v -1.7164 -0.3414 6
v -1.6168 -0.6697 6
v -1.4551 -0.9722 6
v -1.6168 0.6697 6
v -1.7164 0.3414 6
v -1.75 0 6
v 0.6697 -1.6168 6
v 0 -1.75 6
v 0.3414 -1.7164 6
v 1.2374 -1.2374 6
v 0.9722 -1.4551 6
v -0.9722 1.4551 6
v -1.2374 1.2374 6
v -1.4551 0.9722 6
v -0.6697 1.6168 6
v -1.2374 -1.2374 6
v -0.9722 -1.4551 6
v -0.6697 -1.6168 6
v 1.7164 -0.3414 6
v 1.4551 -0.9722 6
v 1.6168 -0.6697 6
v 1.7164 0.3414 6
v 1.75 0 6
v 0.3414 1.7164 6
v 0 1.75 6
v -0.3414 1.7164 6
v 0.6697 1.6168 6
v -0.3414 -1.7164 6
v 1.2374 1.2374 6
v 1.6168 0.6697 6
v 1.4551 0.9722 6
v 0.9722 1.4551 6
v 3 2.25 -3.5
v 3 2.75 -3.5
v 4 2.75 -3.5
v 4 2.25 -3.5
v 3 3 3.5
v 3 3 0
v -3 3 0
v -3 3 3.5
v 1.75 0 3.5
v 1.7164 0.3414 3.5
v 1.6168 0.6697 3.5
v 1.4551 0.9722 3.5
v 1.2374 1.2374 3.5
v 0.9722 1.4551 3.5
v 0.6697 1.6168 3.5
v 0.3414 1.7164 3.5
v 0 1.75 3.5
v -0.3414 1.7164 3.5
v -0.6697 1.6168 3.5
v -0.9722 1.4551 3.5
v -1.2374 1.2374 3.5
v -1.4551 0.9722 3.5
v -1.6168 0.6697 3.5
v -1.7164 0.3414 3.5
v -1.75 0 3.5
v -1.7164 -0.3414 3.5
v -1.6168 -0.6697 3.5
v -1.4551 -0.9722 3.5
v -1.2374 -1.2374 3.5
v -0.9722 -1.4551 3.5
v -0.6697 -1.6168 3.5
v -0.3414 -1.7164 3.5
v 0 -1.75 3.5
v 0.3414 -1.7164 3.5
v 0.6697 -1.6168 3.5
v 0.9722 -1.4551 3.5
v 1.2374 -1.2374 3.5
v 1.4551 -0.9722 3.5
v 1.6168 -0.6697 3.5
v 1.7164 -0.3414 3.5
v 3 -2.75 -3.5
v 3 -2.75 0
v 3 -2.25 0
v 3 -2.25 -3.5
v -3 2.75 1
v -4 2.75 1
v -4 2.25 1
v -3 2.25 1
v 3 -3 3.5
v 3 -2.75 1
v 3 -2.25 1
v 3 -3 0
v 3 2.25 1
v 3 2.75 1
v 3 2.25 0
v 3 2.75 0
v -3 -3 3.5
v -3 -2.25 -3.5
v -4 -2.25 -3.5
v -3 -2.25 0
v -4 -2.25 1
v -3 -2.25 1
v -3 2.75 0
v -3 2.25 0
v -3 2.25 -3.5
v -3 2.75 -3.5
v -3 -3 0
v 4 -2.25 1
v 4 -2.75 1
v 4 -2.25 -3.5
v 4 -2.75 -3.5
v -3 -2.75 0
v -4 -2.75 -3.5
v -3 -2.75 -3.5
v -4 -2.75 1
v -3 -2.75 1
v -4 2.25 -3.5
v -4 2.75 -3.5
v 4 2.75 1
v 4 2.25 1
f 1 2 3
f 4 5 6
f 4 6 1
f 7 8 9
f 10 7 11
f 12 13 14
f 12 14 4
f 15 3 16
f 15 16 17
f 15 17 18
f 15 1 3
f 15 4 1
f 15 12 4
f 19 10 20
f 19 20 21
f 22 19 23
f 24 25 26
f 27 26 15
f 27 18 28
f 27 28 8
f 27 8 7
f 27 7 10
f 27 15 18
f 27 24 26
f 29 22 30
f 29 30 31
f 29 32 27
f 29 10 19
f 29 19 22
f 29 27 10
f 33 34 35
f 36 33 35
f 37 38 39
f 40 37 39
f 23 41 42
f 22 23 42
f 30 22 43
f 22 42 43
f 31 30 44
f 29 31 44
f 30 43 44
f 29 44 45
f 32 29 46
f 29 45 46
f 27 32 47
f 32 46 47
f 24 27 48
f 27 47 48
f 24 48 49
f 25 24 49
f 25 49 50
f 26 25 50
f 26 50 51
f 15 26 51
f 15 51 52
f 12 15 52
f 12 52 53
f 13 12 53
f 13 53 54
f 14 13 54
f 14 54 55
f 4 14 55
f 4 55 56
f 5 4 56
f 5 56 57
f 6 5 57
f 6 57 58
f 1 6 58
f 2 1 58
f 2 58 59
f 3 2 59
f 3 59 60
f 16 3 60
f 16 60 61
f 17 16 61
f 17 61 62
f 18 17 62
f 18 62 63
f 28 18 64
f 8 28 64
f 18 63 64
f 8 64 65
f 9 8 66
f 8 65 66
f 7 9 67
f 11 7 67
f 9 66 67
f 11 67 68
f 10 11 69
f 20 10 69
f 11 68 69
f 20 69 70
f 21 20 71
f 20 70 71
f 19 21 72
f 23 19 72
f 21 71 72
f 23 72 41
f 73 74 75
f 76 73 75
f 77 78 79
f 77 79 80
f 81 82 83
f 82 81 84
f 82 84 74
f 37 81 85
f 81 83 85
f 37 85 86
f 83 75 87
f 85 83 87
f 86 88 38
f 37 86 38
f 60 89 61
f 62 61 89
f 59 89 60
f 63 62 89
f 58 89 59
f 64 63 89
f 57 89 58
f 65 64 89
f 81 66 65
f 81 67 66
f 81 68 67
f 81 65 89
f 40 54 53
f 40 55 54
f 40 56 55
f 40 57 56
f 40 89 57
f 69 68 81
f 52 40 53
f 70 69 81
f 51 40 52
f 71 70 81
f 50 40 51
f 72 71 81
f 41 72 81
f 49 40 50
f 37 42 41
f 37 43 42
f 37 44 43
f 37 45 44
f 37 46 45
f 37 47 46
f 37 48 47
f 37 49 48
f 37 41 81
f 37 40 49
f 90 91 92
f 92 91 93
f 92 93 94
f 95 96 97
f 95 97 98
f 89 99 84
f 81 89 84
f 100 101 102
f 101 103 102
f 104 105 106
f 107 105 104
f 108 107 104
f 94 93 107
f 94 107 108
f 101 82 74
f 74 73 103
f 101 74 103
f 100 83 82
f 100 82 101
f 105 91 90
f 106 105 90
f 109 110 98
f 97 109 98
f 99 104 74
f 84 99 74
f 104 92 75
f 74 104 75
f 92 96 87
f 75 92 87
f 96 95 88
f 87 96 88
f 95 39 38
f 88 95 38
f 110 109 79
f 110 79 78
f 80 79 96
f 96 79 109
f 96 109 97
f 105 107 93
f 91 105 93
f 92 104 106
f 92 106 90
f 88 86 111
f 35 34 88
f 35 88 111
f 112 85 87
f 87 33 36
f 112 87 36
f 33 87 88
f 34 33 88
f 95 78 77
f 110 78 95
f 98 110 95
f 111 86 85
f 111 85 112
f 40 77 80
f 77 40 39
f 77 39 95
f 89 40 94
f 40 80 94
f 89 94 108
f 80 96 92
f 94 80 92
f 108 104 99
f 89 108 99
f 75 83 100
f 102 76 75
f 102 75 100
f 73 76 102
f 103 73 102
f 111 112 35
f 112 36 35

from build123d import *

# Parameters (mm, degrees)
F0_R          = 1.75
F1_DEPTH      = 3.5
F2_DEPTH      = 6
F0_W          = 1
F0_H          = 0.5
F3_DEPTH      = 1
F3_DEPTH_BACK = 3.5


with BuildPart() as f1:
    # F0 (on Top) → F1 (new body)
    with BuildSketch(Plane.XY):
        Polygon((3, 2.75), (3, 3), (-3, 3), (-3, 2.75), (-3, 2.25), (-3, -2.25), (-3, -2.75), (-3, -3), (3, -3), (3, -2.75), (3, -2.25), (3, 2.25), align=None)
        Circle(F0_R, mode=Mode.SUBTRACT)
    extrude(amount=F1_DEPTH)

    # F0 (on Top) → F2 (join)
    with BuildSketch(Plane.XY):
        Circle(F0_R)
    extrude(amount=F2_DEPTH)

    # F0 (on Top) → F3 (join, two sides)
    with BuildSketch(Plane.XY) as f3_sk:
        with Locations((-3.5, -2.5)):
            Rectangle(F0_W, F0_H)
        with Locations((-3.5, 2.5)):
            Rectangle(F0_W, F0_H)
        with Locations((3.5, 2.5)):
            Rectangle(F0_W, F0_H)
        with Locations((3.5, -2.5)):
            Rectangle(F0_W, F0_H)
    extrude(amount=F3_DEPTH)
    extrude(f3_sk.sketch, amount=-F3_DEPTH_BACK)


solid = f1.part
